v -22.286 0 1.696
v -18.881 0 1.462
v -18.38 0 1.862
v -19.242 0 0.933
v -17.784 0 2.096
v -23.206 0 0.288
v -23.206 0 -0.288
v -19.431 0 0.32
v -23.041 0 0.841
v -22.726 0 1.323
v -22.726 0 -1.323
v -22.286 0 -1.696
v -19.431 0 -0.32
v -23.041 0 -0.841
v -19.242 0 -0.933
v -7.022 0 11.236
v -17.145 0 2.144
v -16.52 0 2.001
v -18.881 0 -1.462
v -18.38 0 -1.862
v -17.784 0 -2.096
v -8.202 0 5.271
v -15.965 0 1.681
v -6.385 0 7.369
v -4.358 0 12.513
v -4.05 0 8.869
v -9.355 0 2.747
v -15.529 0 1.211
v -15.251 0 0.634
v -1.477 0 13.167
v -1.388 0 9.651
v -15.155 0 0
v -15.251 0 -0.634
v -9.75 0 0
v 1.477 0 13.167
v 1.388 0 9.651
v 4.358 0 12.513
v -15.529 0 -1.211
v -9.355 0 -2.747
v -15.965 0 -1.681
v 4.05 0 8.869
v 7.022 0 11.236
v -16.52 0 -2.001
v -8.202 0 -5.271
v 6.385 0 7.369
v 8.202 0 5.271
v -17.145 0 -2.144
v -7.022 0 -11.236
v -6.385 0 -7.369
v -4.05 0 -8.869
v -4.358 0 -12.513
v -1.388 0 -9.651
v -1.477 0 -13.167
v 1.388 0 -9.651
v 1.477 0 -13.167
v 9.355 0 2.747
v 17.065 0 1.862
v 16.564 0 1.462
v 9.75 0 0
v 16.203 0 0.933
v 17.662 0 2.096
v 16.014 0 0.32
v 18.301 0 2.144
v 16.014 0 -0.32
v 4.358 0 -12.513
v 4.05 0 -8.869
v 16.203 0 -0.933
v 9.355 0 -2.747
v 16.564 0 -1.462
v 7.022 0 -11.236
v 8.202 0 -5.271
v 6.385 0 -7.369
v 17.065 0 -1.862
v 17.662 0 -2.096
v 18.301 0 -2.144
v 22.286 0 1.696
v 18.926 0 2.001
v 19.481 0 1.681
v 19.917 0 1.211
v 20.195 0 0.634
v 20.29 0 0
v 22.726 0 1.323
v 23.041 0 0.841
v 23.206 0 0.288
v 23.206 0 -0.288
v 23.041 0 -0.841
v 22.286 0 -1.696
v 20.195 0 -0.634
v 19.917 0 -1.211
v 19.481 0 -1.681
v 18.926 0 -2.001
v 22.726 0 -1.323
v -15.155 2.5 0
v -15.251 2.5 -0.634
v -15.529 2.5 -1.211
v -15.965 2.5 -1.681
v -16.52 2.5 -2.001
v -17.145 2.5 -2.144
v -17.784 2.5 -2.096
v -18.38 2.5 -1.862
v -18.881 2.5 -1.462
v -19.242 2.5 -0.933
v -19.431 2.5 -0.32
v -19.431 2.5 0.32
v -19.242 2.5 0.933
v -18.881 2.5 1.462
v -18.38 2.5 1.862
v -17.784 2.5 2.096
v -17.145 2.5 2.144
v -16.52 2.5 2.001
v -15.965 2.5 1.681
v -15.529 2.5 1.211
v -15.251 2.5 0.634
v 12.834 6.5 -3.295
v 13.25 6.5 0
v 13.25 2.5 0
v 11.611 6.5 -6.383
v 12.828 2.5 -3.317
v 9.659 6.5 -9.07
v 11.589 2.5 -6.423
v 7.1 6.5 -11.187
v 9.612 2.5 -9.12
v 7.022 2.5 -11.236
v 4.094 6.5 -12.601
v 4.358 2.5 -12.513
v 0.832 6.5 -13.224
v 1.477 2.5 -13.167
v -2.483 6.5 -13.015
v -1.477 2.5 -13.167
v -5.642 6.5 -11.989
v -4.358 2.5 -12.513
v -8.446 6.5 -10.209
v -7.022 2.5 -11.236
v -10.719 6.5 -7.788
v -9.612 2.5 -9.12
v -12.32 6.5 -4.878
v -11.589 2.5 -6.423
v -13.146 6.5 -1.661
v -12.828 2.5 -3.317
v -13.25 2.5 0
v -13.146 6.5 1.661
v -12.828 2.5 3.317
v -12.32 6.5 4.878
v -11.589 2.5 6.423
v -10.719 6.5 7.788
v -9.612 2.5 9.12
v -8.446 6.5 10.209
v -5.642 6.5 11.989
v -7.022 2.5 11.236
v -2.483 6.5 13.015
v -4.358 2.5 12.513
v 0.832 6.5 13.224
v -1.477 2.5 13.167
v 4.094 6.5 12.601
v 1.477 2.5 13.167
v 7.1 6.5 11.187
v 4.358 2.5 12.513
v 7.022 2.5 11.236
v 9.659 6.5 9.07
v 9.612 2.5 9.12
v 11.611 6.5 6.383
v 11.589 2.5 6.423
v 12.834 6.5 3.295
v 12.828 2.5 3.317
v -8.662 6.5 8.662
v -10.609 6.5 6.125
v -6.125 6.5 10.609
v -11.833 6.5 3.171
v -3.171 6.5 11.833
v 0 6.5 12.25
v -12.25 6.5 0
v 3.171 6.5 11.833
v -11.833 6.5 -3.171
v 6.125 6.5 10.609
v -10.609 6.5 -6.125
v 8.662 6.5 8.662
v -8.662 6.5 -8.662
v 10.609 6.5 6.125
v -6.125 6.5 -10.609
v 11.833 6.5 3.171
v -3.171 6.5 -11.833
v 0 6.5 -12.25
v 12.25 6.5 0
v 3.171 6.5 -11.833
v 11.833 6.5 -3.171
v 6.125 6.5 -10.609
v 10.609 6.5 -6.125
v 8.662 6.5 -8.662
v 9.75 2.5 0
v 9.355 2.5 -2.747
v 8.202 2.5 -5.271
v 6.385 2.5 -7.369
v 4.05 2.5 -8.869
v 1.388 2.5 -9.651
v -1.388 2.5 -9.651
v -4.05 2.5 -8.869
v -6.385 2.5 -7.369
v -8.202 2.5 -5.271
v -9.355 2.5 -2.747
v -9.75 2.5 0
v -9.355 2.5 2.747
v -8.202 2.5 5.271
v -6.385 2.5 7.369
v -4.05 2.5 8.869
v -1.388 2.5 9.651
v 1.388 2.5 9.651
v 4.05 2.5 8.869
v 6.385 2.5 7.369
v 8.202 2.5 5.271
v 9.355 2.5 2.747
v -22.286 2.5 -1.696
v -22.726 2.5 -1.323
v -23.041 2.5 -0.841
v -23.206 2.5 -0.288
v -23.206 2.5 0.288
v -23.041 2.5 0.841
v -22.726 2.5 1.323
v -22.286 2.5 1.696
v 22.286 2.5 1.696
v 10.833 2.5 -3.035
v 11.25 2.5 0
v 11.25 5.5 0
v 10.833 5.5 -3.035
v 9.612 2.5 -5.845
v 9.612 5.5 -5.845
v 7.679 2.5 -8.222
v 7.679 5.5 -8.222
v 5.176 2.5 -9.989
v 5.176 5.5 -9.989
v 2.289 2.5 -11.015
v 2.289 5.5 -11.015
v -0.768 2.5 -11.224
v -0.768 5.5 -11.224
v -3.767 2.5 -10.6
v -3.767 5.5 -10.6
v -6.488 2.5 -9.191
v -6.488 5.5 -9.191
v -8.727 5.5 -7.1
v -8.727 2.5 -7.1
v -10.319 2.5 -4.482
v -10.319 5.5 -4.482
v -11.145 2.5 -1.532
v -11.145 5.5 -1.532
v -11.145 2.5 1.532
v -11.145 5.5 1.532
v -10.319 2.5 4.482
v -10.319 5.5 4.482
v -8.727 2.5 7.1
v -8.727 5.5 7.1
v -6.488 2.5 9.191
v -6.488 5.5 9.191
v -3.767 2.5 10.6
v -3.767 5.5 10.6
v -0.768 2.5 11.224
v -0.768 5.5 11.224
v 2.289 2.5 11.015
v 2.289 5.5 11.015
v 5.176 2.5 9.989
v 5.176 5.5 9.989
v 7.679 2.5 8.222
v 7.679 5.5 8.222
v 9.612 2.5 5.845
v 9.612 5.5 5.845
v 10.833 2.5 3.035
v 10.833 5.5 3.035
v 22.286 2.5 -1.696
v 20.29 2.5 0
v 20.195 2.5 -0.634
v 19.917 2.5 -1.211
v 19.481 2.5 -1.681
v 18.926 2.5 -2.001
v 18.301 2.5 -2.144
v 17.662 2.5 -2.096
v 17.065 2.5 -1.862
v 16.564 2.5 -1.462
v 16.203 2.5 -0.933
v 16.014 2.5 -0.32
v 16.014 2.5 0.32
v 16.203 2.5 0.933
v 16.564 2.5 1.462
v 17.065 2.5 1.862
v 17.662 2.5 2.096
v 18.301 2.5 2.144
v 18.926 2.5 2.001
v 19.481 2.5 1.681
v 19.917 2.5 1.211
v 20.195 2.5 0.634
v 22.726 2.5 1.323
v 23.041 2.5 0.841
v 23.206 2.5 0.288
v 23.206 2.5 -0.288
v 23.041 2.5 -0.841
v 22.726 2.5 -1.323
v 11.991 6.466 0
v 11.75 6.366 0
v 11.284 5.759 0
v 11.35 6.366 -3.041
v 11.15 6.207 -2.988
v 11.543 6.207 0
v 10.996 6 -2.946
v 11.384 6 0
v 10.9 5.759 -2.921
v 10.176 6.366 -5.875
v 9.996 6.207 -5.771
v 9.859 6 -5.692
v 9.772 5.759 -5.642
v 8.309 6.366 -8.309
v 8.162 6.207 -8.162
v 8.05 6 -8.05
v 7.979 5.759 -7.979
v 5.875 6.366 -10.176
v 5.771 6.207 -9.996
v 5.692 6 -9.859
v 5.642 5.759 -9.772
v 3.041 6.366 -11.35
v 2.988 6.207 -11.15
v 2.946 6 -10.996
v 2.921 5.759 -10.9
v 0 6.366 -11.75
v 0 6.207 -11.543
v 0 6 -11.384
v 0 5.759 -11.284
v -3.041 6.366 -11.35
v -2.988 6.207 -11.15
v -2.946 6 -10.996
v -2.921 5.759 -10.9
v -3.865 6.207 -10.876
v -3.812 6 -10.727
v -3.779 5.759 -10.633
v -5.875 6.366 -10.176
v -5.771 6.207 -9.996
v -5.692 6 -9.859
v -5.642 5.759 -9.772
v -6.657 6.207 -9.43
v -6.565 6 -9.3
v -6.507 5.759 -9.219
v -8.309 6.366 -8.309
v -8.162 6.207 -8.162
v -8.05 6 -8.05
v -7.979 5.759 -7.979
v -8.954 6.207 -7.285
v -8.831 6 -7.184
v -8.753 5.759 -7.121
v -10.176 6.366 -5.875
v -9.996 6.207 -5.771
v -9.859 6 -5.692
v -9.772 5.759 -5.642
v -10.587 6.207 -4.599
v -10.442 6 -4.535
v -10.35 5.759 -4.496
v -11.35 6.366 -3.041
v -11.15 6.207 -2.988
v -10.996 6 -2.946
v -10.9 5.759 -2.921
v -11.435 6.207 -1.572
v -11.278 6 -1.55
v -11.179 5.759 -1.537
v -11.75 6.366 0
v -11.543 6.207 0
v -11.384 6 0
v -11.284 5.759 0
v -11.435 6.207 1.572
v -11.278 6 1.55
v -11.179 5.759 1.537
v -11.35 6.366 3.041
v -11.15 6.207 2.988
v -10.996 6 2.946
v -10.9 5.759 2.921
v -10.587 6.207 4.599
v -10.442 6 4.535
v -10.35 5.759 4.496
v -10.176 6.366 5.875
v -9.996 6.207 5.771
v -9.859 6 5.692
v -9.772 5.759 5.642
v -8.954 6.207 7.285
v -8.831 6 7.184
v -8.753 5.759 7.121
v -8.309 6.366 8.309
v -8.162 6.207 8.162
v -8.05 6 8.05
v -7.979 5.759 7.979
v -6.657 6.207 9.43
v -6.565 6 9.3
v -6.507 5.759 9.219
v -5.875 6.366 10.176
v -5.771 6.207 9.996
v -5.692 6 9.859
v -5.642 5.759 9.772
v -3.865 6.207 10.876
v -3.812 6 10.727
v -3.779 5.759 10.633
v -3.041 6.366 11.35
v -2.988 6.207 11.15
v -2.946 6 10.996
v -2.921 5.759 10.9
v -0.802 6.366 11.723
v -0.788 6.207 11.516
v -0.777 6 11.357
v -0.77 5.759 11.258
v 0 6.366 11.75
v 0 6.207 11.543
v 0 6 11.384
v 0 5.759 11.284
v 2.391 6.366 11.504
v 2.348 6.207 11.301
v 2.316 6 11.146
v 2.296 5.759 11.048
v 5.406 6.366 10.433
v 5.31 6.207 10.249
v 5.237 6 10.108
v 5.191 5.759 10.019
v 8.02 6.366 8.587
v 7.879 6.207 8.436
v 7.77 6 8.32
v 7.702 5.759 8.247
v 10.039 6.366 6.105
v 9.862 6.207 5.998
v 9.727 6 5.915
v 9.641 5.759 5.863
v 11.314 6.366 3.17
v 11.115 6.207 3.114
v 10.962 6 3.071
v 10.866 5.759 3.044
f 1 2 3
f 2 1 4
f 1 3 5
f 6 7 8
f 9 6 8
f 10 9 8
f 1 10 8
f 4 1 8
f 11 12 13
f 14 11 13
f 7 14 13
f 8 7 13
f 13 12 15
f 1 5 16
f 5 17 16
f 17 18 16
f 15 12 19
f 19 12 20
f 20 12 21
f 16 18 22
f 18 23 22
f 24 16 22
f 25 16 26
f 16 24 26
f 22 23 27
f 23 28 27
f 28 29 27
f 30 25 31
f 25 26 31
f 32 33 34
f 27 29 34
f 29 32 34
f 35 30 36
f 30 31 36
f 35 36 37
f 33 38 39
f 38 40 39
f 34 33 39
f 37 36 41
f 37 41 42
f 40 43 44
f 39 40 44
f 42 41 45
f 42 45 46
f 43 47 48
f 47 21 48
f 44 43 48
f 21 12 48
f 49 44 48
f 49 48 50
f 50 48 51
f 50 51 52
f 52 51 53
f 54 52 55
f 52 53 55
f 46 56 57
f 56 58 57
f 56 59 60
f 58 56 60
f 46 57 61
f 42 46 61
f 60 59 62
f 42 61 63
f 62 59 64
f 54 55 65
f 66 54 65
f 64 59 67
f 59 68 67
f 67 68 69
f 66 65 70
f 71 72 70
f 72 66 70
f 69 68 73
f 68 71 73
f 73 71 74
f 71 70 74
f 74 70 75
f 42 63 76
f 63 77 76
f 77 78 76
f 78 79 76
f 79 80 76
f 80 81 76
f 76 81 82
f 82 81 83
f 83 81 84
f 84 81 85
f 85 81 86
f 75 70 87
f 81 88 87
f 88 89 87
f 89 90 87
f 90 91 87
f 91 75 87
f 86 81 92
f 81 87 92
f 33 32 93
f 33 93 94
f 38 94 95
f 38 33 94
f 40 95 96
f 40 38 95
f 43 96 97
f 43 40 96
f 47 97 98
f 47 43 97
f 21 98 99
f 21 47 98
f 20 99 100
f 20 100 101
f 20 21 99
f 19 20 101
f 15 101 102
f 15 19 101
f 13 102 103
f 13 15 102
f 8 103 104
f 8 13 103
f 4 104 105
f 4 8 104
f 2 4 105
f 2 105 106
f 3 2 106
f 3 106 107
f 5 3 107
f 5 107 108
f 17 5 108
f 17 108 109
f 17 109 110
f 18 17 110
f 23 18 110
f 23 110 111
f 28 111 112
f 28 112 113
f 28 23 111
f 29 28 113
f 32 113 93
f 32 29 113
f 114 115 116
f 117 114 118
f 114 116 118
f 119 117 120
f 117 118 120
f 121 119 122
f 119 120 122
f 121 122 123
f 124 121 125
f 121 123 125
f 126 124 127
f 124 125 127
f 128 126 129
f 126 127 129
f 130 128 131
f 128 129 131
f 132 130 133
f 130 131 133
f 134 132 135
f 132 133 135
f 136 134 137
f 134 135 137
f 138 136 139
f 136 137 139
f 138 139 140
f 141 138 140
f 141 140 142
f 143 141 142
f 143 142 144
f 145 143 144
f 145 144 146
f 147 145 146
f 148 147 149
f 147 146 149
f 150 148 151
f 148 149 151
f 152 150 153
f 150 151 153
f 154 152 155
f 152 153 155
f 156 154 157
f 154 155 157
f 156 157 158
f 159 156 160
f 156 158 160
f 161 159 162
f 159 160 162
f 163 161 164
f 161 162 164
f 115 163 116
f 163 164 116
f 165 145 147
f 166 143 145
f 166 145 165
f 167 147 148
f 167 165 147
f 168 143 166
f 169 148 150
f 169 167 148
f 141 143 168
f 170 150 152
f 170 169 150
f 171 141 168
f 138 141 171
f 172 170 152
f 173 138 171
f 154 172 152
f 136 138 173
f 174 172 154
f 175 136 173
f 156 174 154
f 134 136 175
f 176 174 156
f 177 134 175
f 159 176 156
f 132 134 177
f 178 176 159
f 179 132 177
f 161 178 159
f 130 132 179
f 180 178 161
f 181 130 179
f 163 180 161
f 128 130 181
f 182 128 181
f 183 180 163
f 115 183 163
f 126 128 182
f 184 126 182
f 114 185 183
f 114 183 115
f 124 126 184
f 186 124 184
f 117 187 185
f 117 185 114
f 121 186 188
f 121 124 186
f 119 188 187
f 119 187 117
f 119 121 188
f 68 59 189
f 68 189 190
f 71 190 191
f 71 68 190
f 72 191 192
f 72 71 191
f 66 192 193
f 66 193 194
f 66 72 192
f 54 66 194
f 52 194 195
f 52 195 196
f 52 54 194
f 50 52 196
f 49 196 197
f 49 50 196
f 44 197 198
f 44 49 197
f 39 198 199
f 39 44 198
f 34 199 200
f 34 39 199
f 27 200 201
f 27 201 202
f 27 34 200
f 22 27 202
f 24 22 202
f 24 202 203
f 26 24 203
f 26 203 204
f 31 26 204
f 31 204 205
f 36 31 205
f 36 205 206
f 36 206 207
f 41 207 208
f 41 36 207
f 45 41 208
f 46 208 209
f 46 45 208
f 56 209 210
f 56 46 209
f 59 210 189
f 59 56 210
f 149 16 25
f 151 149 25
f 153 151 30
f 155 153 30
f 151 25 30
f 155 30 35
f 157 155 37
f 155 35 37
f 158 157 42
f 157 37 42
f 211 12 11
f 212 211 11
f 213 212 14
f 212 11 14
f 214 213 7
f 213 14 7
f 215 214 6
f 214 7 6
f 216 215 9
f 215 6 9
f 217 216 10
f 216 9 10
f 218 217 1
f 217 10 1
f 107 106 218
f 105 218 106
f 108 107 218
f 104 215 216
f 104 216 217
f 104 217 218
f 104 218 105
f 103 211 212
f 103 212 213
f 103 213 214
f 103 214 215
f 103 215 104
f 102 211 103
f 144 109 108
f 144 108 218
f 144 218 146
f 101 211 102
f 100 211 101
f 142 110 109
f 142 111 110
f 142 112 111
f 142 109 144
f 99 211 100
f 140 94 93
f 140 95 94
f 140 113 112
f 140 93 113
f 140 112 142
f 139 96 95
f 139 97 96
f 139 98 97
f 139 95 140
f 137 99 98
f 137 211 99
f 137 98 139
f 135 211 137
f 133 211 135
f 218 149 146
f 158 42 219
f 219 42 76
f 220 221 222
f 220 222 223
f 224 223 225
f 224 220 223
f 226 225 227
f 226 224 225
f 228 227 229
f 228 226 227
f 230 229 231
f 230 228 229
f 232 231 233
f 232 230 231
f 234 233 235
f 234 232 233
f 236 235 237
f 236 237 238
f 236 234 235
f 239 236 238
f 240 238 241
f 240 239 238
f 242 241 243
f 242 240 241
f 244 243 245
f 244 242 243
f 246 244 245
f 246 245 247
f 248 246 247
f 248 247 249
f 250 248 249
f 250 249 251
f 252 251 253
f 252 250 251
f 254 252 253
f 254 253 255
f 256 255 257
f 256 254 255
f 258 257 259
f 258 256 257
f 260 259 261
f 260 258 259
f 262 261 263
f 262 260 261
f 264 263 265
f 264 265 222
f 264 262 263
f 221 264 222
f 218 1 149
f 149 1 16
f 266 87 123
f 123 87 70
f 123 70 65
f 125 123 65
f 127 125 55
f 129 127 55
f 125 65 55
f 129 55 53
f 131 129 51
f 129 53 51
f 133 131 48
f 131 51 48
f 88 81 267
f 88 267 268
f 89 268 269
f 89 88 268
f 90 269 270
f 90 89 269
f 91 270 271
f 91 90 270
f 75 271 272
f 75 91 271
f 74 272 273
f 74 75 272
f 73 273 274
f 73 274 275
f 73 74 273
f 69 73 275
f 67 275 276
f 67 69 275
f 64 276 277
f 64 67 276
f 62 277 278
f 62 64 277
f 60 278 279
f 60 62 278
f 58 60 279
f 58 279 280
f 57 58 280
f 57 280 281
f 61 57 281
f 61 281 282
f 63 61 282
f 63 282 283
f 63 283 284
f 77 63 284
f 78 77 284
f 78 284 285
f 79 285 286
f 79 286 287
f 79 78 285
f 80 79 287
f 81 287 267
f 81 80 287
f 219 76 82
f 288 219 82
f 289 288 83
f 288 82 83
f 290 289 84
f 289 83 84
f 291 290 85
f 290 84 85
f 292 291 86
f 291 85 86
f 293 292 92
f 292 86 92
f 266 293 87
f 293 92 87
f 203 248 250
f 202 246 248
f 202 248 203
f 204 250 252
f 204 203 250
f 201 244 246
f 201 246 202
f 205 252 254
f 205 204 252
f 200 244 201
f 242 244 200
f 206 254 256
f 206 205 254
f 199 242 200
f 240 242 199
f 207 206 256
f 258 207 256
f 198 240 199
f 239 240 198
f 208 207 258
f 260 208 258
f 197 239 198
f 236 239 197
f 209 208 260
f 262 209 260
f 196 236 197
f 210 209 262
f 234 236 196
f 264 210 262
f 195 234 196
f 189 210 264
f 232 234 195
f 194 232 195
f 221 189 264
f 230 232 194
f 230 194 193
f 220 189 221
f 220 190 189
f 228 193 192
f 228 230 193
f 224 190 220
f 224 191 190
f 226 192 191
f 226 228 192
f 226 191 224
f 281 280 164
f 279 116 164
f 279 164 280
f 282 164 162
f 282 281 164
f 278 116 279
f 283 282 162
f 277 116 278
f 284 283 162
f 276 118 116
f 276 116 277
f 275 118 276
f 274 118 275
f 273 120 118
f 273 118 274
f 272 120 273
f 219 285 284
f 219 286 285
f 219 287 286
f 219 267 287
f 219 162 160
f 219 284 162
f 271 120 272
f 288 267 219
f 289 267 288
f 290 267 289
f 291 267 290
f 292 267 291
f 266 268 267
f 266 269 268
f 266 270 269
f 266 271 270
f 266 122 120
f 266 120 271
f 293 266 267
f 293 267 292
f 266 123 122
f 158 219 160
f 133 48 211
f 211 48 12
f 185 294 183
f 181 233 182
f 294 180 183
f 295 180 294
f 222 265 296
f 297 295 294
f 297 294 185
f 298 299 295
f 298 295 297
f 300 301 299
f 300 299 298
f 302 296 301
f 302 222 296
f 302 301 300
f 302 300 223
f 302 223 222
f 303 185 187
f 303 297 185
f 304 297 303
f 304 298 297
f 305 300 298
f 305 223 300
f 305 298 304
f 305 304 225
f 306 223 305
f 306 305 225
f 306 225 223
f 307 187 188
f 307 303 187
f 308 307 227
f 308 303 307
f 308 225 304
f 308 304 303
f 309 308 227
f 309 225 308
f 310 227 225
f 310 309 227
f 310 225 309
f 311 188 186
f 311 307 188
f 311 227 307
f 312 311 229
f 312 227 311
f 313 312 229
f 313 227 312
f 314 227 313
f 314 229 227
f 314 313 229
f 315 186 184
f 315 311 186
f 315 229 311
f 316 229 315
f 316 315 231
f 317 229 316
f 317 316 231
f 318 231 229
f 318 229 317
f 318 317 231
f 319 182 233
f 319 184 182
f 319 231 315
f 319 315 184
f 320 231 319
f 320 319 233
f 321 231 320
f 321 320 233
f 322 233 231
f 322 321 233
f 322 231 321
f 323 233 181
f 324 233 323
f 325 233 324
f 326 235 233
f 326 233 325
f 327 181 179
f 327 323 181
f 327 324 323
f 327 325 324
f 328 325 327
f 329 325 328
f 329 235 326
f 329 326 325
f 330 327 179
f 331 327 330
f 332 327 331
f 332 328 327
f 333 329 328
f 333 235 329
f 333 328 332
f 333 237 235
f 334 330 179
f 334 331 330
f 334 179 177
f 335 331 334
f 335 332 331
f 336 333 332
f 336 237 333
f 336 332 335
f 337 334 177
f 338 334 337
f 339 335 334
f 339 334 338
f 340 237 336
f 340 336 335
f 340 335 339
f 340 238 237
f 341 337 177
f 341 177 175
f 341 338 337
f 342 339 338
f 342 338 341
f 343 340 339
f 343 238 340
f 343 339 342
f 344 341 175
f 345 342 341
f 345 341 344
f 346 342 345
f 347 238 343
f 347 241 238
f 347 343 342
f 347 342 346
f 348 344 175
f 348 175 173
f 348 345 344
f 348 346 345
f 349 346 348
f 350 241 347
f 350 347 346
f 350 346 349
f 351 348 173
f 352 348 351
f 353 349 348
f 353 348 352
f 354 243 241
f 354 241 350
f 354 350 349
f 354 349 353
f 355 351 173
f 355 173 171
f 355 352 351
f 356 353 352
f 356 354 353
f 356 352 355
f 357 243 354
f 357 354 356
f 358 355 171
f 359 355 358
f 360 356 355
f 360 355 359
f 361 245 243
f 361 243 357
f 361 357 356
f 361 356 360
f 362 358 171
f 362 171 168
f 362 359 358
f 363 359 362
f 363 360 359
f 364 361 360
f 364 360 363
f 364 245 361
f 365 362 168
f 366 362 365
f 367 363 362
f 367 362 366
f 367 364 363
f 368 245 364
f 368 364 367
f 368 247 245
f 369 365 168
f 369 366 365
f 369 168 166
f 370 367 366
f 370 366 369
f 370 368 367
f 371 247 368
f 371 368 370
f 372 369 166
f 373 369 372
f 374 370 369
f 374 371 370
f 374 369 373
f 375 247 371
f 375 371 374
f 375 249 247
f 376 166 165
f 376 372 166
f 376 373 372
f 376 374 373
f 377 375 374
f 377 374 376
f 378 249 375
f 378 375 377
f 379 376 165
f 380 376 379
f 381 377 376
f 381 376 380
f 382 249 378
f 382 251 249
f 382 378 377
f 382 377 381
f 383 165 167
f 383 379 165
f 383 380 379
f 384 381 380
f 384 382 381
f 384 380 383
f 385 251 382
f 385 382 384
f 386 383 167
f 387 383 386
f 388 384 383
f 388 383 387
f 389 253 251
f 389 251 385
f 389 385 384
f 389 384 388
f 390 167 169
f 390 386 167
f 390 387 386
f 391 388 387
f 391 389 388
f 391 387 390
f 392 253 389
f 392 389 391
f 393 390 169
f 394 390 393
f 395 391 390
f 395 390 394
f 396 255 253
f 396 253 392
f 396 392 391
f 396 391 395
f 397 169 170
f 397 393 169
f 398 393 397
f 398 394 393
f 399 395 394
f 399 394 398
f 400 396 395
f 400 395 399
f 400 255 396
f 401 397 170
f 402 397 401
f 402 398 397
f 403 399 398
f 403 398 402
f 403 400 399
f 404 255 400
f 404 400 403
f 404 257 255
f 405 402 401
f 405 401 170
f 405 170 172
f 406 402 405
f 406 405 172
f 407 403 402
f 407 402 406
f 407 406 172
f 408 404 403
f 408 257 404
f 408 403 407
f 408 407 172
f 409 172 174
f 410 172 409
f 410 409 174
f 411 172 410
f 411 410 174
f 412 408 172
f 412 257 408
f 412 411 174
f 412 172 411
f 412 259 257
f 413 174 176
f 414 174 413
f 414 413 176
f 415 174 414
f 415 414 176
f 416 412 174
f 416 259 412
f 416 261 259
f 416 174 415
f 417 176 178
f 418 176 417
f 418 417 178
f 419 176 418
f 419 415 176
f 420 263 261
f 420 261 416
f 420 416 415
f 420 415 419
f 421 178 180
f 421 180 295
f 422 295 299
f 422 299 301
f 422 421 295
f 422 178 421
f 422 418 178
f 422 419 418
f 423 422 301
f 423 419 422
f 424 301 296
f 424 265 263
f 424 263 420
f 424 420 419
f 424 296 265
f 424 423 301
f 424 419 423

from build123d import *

# Parameters (mm, degrees)
ESQUISSE1_R        = 2.15
ESQUISSE1_R_2      = 9.75
BOSS_EXTRU_1_DEPTH = 2.5
ESQUISSE2_R        = 13.25
ESQUISSE2_R_2      = 11.25
BOSS_EXTRU_2_DEPTH = 4
CONG_1_R           = 1


with BuildPart() as part:
    # Esquisse1 → Boss.-Extru.1 (new body)
    with BuildSketch(Plane(origin=(0, 0, 0), x_dir=(1, 0, 0), z_dir=(0, 1, 0))):
        with BuildLine():
            Line((-7.0225, 11.23596875), (-22.286415094, 1.695995283))
            ThreePointArc((-22.286415094, 1.695995283), (-23.226415094, 0), (-22.286415094, -1.695995283))
            Line((-22.286415094, -1.695995283), (-7.0225, -11.23596875))
            ThreePointArc((-7.0225, -11.23596875), (0, -13.25), (7.0225, -11.23596875))
            Line((7.0225, -11.23596875), (22.286415094, -1.695995283))
            ThreePointArc((22.286415094, -1.695995283), (23.226415094, 0), (22.286415094, 1.695995283))
            Line((22.286415094, 1.695995283), (7.0225, 11.23596875))
            ThreePointArc((7.0225, 11.23596875), (0, 13.25), (-7.0225, 11.23596875))
        make_face()
        with Locations((-17.305198029, 0)):
            Circle(ESQUISSE1_R, mode=Mode.SUBTRACT)
        Circle(ESQUISSE1_R_2, mode=Mode.SUBTRACT)
        with Locations((18.140226284, 0)):
            Circle(ESQUISSE1_R, mode=Mode.SUBTRACT)
    extrude(amount=BOSS_EXTRU_1_DEPTH)

    # Esquisse2 → Boss.-Extru.2 (add)
    with BuildSketch(Plane(origin=(0, 2.5, 0), x_dir=(1, 0, 0), z_dir=(0, 1, 0))):
        Circle(ESQUISSE2_R)
        Circle(ESQUISSE2_R_2, mode=Mode.SUBTRACT)
    extrude(amount=BOSS_EXTRU_2_DEPTH)

    # Congé1
    cong_1_edges = [part.edges().sort_by_distance(p)[0] for p in [
        (-11.25, 6.5, 0),
    ]]
    fillet(cong_1_edges, radius=CONG_1_R)


solid = part.part
